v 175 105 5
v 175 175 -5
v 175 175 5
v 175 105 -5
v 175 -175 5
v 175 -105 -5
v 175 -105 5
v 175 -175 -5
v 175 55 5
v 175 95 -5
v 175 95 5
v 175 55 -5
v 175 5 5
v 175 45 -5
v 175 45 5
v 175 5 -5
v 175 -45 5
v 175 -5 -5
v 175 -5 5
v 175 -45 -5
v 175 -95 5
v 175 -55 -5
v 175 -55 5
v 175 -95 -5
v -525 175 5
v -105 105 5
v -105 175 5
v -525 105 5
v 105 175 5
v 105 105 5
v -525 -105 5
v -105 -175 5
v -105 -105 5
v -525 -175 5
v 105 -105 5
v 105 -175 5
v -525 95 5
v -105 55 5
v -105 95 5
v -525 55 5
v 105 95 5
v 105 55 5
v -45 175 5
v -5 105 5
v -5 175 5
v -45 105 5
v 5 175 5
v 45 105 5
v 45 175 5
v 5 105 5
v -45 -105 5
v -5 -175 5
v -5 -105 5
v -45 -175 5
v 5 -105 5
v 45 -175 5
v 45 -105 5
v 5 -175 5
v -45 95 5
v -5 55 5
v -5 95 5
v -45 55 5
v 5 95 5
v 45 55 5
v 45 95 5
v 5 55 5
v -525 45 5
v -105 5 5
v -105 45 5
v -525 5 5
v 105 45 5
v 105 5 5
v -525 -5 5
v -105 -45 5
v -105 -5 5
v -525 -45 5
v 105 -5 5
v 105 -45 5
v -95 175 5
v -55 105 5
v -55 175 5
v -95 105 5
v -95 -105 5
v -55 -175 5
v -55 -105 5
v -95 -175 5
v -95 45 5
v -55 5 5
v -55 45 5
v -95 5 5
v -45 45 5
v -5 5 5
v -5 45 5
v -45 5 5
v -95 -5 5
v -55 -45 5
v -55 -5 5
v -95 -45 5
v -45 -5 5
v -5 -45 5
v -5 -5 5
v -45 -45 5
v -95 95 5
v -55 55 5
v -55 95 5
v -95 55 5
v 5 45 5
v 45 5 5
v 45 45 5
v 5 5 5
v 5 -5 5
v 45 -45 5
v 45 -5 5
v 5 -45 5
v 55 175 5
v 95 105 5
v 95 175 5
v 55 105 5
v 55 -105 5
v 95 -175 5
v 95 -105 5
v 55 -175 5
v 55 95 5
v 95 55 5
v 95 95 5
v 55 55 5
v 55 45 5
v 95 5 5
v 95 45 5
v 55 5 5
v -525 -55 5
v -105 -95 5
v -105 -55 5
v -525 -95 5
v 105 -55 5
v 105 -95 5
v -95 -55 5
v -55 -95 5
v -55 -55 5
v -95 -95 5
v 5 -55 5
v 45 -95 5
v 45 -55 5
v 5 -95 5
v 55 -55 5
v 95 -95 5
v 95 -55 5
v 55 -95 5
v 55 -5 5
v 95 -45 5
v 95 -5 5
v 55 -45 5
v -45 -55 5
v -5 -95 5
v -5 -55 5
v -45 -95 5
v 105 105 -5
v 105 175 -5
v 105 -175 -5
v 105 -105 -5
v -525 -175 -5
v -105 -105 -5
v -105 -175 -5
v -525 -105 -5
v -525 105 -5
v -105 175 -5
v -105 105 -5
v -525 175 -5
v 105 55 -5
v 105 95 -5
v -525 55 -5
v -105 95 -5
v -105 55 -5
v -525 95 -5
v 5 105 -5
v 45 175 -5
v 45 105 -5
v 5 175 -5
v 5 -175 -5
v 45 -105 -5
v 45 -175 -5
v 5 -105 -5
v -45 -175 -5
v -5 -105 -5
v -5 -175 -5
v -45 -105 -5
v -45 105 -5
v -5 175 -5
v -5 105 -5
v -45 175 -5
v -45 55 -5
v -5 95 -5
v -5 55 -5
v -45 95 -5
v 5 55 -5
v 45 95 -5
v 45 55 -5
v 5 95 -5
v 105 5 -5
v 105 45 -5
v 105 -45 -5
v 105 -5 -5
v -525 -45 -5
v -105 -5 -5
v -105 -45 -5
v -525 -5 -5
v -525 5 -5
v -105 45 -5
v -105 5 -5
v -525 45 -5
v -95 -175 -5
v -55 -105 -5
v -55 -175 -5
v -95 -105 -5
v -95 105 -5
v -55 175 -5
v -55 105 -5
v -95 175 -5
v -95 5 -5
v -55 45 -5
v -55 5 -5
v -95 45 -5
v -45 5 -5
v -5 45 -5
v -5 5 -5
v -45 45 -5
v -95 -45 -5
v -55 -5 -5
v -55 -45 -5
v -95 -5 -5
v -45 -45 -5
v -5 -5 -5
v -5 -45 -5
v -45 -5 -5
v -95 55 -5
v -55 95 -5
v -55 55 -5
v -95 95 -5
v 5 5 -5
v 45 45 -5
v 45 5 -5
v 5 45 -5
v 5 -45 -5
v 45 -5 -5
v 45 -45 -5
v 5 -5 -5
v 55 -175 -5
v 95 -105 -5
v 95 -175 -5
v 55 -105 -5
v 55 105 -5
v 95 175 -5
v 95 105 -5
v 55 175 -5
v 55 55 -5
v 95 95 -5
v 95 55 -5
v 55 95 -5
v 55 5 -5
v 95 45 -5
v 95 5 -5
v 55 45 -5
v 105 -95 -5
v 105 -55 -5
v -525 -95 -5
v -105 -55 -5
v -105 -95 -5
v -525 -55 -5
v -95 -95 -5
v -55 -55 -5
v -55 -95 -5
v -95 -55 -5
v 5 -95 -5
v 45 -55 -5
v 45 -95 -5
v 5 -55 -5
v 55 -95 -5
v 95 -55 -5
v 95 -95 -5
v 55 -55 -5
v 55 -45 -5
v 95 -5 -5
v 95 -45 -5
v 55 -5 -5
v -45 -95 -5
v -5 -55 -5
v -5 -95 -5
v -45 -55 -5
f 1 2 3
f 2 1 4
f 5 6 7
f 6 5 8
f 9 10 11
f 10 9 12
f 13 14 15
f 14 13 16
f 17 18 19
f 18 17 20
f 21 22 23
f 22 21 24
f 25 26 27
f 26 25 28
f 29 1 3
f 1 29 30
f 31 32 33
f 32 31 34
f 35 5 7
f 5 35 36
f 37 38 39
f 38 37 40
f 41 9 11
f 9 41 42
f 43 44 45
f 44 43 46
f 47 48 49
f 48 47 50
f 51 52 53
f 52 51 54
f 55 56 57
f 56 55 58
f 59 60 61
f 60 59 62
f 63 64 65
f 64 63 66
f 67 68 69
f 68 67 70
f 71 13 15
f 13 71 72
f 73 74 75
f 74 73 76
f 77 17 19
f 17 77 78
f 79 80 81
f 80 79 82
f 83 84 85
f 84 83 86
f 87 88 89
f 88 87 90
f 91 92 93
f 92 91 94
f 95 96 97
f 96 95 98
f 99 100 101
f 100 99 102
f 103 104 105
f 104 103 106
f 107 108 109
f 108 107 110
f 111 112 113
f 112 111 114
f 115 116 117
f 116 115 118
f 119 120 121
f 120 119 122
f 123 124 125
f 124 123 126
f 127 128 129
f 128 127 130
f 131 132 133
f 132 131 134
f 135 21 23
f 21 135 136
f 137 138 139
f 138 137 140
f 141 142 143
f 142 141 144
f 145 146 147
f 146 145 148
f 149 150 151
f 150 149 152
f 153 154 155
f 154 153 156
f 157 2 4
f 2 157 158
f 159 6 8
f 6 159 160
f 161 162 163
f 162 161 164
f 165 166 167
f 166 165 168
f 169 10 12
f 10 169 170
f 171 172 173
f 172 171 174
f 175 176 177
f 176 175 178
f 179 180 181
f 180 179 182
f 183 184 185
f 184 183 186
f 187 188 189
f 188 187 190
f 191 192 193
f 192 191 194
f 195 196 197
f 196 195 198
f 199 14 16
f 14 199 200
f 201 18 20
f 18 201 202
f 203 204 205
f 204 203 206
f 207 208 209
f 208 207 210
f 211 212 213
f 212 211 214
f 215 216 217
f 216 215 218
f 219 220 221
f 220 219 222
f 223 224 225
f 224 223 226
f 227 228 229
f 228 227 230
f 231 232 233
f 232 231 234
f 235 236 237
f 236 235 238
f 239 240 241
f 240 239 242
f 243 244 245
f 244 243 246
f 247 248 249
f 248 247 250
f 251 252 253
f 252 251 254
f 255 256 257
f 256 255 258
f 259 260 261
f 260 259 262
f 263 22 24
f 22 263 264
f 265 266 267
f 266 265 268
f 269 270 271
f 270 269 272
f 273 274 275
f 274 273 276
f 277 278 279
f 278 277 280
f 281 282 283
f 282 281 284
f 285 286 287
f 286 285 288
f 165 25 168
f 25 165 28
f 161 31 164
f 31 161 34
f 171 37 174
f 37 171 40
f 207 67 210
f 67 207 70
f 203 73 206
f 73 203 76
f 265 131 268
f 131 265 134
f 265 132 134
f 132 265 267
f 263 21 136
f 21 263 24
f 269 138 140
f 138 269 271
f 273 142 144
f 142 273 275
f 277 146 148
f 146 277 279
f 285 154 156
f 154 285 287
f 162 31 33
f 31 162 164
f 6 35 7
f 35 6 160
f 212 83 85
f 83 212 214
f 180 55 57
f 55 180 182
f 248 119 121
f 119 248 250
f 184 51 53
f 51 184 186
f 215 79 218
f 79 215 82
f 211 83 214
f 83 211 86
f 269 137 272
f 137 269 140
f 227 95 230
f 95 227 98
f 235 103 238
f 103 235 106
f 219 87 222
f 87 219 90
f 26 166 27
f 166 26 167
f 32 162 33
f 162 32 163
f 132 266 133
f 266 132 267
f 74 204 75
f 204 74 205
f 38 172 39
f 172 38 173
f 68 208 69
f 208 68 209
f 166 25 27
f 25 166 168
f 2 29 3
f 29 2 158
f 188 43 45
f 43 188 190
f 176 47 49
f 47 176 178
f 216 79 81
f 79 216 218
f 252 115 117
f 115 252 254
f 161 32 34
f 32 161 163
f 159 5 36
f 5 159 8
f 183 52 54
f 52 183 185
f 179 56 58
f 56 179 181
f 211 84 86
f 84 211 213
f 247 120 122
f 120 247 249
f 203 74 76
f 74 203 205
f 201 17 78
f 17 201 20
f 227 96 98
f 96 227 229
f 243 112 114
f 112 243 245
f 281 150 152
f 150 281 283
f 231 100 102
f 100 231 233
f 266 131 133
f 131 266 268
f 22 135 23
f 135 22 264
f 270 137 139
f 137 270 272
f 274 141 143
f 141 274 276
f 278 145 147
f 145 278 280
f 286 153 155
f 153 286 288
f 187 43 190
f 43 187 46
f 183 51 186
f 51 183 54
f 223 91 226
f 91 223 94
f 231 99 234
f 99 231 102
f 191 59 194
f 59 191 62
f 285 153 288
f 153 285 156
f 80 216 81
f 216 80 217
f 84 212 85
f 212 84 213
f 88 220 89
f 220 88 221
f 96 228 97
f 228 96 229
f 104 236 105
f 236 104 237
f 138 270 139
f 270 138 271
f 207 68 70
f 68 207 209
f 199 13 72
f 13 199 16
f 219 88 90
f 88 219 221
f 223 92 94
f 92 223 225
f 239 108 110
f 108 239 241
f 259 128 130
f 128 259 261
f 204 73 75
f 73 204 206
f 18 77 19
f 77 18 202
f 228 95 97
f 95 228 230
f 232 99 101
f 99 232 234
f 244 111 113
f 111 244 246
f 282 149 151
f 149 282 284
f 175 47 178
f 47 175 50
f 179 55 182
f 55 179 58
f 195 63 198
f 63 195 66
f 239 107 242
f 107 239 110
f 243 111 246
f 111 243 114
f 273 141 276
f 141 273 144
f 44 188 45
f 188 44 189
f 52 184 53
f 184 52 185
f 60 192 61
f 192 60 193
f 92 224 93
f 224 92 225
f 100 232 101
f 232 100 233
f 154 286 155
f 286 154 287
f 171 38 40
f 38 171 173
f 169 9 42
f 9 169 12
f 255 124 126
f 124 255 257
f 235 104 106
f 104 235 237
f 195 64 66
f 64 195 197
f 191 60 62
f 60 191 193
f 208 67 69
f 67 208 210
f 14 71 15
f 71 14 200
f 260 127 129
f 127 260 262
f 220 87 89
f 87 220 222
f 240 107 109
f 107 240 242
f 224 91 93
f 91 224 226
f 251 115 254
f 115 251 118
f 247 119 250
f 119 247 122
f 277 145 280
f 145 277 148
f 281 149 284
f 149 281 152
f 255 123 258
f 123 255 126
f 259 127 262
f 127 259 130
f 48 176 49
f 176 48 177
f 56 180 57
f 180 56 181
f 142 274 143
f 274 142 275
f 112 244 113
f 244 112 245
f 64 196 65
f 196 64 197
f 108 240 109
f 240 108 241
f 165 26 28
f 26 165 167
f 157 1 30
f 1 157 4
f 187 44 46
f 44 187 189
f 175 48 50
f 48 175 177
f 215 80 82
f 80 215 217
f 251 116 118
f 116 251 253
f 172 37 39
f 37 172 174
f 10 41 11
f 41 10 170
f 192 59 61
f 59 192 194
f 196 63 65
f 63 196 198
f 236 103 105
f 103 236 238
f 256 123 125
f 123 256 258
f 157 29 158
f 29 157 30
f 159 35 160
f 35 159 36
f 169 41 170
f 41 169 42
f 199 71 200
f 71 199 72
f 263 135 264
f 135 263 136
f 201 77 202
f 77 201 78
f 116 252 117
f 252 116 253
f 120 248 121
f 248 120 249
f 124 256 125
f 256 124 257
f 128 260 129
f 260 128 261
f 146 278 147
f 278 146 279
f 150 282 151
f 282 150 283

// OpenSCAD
// OpenSCAD file
// Side of the cage
difference() {
  translate([-175, 0, 0]) cube([700, 350, 10], center = true);
  for (i = [-2:2]) {
    translate([-175, i * 50, 0]) cube([700, 10, 10], center = true);
    translate([i * 50, 0, 0]) cube([10, 350, 10], center = true);
  }
  translate([-175, 0, 5]) cylinder(h = 10, r = 3, $fn = 100);
  translate([175, 0, 5]) cylinder(h = 10, r = 3, $fn = 100);
}
